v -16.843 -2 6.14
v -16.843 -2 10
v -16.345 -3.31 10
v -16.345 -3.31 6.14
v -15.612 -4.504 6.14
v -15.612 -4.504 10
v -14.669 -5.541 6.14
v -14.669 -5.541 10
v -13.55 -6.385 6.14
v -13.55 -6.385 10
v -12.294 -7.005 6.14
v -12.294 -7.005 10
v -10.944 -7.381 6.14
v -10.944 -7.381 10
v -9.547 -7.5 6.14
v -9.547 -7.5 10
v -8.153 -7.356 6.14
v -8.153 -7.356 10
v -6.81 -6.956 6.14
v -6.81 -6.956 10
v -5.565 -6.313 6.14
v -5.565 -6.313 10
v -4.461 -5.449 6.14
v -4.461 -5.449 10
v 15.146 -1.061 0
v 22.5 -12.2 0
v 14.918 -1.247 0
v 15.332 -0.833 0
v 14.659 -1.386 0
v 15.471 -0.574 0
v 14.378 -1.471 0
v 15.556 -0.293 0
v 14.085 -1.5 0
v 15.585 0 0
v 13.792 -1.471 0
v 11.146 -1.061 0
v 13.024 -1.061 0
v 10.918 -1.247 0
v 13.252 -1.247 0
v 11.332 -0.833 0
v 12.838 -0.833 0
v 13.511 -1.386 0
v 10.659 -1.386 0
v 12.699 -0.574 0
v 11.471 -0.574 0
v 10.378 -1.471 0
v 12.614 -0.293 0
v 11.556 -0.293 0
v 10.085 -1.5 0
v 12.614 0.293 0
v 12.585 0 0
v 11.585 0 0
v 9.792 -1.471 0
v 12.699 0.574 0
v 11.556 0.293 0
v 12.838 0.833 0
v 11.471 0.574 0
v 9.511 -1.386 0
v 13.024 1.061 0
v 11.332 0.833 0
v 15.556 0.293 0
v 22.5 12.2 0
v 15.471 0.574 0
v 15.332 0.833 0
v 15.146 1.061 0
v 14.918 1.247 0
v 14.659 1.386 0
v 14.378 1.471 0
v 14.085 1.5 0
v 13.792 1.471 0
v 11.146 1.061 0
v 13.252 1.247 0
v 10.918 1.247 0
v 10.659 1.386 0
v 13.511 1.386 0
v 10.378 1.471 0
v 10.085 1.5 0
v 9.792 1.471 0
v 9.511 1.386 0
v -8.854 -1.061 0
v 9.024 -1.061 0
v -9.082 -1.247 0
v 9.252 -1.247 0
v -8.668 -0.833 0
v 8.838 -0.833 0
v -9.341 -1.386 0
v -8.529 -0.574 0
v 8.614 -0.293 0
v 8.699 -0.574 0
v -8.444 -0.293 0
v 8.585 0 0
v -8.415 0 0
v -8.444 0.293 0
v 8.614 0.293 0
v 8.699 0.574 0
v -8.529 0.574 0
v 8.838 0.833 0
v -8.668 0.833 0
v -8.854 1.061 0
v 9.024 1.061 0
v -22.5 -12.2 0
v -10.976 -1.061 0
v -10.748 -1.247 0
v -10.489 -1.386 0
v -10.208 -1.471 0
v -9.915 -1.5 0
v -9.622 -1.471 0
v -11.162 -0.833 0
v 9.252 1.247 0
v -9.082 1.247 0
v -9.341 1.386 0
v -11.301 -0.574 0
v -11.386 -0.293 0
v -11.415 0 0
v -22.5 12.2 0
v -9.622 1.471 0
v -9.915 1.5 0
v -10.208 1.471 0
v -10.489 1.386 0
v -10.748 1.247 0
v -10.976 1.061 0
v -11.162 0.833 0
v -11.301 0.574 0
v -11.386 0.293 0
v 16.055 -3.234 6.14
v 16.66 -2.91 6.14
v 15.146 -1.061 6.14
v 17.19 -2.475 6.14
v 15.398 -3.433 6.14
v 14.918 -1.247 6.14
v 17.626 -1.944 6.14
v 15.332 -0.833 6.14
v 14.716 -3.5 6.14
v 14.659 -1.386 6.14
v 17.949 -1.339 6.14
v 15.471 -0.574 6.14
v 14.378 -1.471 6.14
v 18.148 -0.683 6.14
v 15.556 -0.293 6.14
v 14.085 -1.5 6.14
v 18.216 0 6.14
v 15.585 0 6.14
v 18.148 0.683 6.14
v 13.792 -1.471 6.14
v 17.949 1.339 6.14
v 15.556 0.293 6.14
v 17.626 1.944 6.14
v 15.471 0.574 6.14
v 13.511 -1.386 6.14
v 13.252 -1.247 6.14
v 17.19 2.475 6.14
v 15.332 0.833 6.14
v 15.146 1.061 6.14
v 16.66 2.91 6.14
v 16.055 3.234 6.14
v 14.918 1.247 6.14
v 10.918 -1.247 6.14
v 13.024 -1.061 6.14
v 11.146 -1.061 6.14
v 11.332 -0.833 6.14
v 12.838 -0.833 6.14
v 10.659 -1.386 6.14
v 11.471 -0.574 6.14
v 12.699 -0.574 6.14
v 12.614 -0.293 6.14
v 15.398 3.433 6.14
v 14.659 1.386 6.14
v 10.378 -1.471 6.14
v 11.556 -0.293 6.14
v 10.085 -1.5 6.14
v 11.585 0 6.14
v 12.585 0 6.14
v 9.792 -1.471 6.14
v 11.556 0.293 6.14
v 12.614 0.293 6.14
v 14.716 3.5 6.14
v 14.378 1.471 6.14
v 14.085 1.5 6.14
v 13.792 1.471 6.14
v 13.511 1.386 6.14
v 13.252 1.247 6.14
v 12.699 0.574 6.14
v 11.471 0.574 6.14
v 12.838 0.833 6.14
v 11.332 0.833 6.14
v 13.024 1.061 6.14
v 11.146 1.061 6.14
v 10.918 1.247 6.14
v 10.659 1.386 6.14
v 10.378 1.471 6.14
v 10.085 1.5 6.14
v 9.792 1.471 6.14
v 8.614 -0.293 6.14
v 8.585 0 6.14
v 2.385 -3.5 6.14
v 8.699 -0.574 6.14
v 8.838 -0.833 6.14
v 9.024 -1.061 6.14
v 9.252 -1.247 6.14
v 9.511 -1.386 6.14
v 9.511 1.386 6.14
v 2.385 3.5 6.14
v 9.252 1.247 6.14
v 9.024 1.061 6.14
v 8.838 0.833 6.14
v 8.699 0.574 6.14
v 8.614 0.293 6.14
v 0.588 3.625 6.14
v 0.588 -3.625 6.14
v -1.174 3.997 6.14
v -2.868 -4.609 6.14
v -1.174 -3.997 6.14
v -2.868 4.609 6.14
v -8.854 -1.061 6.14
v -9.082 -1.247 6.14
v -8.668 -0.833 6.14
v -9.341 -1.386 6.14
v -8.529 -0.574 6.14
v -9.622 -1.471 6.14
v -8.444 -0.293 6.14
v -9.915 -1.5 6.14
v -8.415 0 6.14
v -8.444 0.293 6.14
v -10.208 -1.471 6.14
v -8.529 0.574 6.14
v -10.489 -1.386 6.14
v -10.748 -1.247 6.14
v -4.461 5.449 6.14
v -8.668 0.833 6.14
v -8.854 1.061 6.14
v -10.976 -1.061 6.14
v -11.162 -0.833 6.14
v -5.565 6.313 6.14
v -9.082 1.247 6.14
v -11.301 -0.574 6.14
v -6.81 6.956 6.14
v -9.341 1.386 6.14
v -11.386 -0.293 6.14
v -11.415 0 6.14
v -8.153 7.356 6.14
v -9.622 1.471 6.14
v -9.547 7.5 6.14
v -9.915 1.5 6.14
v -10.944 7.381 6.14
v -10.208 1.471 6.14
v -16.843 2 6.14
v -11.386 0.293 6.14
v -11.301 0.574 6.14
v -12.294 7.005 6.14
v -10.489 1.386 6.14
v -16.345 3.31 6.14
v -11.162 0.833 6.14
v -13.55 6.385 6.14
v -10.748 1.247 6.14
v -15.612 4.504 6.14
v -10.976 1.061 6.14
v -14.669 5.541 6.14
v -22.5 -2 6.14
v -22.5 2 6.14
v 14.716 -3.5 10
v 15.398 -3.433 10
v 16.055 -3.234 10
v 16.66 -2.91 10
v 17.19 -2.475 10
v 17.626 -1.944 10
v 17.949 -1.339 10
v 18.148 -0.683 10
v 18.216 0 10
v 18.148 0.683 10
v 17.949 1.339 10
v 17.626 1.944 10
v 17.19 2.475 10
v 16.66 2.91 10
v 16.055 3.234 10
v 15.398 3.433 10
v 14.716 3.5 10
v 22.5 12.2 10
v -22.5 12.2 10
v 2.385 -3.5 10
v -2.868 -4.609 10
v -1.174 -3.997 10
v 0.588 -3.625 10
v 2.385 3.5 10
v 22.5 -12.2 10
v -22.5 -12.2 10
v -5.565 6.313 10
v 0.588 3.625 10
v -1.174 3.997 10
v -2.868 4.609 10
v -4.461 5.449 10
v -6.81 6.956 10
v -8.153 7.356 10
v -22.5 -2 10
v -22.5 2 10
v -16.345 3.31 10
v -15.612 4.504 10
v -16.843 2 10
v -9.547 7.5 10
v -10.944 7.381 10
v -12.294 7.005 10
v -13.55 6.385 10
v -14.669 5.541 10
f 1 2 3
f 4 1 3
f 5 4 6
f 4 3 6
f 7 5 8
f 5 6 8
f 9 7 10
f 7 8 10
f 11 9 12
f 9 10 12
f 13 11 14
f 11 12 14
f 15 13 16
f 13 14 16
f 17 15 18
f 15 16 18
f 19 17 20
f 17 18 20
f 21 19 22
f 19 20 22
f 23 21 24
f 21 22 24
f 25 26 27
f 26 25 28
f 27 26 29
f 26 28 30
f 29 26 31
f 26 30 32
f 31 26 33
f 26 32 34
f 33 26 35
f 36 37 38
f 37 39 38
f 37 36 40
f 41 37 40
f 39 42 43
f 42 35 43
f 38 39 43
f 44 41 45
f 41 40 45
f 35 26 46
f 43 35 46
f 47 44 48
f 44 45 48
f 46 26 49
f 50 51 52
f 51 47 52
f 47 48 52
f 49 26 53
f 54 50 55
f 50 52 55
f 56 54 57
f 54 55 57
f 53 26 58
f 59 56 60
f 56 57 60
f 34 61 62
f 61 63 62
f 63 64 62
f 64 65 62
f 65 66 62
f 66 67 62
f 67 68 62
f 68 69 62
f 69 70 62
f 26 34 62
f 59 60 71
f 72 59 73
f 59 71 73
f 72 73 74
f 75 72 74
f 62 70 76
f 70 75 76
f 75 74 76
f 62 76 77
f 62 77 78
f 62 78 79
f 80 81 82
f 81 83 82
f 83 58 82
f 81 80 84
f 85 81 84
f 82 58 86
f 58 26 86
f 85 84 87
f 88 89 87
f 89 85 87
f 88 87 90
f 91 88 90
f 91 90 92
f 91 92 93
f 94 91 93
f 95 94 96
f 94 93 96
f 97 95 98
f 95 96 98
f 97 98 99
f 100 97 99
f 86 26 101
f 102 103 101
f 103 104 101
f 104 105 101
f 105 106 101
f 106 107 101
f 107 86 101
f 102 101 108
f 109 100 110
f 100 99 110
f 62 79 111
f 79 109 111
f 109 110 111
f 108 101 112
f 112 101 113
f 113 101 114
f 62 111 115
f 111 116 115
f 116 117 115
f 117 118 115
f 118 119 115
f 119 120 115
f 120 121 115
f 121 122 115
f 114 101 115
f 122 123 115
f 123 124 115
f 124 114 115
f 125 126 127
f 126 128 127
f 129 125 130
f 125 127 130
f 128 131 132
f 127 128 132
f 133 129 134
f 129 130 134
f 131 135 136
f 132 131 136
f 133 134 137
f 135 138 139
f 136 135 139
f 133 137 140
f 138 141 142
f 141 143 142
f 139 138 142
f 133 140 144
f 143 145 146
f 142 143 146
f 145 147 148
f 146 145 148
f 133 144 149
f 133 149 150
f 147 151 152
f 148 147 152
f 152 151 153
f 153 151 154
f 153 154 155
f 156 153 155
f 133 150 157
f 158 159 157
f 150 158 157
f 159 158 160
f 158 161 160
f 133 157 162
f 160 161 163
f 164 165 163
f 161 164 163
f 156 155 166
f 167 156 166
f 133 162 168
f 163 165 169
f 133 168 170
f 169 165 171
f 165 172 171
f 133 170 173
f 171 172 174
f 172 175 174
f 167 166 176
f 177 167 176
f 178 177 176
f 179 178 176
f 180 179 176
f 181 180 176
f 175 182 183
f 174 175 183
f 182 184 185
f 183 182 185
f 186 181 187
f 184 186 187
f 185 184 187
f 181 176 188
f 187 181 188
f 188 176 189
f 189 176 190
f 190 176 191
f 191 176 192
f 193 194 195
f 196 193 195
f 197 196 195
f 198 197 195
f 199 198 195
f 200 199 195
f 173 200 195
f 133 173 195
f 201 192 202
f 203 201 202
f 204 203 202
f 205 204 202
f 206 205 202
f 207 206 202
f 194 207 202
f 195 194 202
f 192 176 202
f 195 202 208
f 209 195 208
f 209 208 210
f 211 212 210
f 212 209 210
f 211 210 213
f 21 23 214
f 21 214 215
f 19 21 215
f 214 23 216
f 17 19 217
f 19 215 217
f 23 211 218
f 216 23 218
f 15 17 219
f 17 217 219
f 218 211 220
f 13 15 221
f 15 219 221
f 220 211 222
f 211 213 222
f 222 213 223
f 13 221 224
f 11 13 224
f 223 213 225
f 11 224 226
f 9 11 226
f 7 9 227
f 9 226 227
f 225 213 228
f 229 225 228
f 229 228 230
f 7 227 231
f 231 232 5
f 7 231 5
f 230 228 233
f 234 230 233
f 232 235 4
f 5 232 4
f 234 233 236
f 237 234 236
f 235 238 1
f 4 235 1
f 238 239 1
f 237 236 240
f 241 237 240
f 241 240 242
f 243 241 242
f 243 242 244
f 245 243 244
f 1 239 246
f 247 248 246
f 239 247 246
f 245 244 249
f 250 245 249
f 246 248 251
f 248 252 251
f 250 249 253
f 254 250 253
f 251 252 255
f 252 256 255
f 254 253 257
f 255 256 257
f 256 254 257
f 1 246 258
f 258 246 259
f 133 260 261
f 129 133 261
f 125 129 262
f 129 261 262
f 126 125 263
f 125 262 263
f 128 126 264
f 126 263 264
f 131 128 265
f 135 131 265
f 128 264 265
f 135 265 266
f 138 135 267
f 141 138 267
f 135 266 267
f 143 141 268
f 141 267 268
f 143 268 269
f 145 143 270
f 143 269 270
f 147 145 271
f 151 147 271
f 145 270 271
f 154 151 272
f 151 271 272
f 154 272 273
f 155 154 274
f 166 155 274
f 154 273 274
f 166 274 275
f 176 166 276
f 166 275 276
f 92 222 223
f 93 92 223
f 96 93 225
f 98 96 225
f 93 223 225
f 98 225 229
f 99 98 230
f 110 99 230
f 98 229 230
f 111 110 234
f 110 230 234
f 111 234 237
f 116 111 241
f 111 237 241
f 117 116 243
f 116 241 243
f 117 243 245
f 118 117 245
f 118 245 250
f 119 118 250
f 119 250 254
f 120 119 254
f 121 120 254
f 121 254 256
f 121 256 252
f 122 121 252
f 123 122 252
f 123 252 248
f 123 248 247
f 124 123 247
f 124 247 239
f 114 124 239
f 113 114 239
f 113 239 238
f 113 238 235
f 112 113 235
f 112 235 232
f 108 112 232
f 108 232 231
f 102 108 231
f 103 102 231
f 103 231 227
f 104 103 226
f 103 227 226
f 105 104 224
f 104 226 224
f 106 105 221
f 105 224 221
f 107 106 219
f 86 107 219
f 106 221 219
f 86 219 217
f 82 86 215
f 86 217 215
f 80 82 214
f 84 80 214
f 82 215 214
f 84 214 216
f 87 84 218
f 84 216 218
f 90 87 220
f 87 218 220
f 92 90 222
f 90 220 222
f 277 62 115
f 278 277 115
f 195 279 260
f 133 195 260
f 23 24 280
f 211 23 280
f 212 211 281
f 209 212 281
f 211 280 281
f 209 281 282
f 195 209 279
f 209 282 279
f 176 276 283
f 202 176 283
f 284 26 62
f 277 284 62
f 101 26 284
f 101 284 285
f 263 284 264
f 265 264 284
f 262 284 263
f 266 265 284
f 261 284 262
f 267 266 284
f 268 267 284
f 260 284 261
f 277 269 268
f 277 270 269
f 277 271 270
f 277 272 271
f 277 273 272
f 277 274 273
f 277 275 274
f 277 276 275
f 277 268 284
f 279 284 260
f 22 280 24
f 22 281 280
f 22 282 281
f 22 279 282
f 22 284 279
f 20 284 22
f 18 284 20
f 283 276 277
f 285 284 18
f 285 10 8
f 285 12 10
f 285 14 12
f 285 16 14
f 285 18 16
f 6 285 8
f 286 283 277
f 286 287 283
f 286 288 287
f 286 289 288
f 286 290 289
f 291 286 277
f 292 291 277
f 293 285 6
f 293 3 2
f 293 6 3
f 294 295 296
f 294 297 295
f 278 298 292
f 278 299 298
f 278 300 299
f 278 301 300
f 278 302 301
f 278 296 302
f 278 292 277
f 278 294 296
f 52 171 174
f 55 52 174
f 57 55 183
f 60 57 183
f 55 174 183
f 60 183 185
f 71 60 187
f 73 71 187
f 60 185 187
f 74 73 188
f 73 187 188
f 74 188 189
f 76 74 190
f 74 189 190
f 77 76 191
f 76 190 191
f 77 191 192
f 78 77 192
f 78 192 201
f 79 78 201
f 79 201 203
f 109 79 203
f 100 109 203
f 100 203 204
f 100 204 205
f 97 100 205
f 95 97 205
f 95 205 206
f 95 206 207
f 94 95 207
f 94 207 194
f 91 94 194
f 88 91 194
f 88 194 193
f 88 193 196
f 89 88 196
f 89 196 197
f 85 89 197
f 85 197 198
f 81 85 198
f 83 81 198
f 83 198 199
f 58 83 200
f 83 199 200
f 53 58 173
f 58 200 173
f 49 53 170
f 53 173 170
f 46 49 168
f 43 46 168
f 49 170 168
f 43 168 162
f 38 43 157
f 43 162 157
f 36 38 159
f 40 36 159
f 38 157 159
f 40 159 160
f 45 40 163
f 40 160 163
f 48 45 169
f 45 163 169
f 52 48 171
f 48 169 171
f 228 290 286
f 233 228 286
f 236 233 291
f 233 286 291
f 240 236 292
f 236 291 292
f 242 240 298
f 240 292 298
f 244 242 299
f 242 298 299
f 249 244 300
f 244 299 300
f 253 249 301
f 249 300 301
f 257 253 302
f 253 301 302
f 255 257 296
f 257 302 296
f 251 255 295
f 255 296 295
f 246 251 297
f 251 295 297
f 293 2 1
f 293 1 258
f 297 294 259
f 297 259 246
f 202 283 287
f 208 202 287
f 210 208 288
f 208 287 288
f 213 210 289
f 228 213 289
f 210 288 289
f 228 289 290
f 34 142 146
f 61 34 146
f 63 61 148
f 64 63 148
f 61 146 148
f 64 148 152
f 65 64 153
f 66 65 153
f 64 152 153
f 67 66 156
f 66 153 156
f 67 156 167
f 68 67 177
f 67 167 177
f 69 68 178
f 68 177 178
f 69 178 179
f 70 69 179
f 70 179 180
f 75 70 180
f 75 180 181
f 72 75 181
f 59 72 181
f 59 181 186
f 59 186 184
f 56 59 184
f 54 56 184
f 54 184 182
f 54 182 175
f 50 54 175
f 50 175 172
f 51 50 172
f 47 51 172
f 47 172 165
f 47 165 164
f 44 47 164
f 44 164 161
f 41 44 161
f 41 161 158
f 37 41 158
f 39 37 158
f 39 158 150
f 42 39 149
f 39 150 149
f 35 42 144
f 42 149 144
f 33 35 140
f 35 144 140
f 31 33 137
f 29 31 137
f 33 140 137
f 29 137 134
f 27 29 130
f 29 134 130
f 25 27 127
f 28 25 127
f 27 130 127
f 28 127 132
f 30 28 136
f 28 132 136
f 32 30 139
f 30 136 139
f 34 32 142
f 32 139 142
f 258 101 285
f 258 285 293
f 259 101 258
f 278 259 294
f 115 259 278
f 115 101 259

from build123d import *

# Parameters (mm, degrees)
SKETCH2_W           = 24.4
SKETCH2_H           = 45
BOSS_EXTRUDE1_DEPTH = 10
CUT_EXTRUDE1_DEPTH  = 3.86
SKETCH4_R           = 1.5
CUT_EXTRUDE2_DEPTH  = 27.320896641
CUT_EXTRUDE4_DEPTH  = 3.86


with BuildPart() as part:
    # Sketch2 → Boss-Extrude1 (new body)
    with BuildSketch(Plane(origin=(0, 0, 0), x_dir=(0, 1, 0), z_dir=(0, 0, 1))):
        Rectangle(SKETCH2_W, SKETCH2_H)
    extrude(amount=BOSS_EXTRUDE1_DEPTH)

    # Sketch3 → Cut-Extrude1 (cut)
    with BuildSketch(Plane.XY.offset(10)):
        with BuildLine():
            Line((14.715504893, 3.5), (2.384966333, 3.5))
            ThreePointArc((2.384966333, 3.5), (-1.174243063, 3.996719292), (-4.461463541, 5.448918697))
            ThreePointArc((-4.461463541, 5.448918697), (-17.115033667, 0), (-4.461463541, -5.448918697))
            ThreePointArc((-4.461463541, -5.448918697), (-1.174243063, -3.996719292), (2.384966333, -3.5))
            Line((2.384966333, -3.5), (14.715504893, -3.5))
            ThreePointArc((14.715504893, -3.5), (18.215504893, 0), (14.715504893, 3.5))
        make_face()
    extrude(amount=-CUT_EXTRUDE1_DEPTH, mode=Mode.SUBTRACT)

    # Sketch4 → Cut-Extrude2 (cut, through all)
    with BuildSketch(Plane.XY.offset(6.14)):
        with Locations((10.084966333, 0)):
            Circle(SKETCH4_R)
        with Locations((14.084966333, 0)):
            Circle(SKETCH4_R)
        with Locations((-9.915033667, 0)):
            Circle(SKETCH4_R)
    extrude(amount=-CUT_EXTRUDE2_DEPTH, mode=Mode.SUBTRACT)

    # Sketch6 → Cut-Extrude4 (cut)
    with BuildSketch(Plane.XY.offset(10)):
        with BuildLine():
            Line((-22.5, 2), (-16.843449814, 2))
            ThreePointArc((-16.843449814, 2), (-17.115033667, 0), (-16.843449814, -2))
            Line((-16.843449814, -2), (-22.5, -2))
            Line((-22.5, -2), (-22.5, 2))
        make_face()
    extrude(amount=-CUT_EXTRUDE4_DEPTH, mode=Mode.SUBTRACT)


solid = part.part
